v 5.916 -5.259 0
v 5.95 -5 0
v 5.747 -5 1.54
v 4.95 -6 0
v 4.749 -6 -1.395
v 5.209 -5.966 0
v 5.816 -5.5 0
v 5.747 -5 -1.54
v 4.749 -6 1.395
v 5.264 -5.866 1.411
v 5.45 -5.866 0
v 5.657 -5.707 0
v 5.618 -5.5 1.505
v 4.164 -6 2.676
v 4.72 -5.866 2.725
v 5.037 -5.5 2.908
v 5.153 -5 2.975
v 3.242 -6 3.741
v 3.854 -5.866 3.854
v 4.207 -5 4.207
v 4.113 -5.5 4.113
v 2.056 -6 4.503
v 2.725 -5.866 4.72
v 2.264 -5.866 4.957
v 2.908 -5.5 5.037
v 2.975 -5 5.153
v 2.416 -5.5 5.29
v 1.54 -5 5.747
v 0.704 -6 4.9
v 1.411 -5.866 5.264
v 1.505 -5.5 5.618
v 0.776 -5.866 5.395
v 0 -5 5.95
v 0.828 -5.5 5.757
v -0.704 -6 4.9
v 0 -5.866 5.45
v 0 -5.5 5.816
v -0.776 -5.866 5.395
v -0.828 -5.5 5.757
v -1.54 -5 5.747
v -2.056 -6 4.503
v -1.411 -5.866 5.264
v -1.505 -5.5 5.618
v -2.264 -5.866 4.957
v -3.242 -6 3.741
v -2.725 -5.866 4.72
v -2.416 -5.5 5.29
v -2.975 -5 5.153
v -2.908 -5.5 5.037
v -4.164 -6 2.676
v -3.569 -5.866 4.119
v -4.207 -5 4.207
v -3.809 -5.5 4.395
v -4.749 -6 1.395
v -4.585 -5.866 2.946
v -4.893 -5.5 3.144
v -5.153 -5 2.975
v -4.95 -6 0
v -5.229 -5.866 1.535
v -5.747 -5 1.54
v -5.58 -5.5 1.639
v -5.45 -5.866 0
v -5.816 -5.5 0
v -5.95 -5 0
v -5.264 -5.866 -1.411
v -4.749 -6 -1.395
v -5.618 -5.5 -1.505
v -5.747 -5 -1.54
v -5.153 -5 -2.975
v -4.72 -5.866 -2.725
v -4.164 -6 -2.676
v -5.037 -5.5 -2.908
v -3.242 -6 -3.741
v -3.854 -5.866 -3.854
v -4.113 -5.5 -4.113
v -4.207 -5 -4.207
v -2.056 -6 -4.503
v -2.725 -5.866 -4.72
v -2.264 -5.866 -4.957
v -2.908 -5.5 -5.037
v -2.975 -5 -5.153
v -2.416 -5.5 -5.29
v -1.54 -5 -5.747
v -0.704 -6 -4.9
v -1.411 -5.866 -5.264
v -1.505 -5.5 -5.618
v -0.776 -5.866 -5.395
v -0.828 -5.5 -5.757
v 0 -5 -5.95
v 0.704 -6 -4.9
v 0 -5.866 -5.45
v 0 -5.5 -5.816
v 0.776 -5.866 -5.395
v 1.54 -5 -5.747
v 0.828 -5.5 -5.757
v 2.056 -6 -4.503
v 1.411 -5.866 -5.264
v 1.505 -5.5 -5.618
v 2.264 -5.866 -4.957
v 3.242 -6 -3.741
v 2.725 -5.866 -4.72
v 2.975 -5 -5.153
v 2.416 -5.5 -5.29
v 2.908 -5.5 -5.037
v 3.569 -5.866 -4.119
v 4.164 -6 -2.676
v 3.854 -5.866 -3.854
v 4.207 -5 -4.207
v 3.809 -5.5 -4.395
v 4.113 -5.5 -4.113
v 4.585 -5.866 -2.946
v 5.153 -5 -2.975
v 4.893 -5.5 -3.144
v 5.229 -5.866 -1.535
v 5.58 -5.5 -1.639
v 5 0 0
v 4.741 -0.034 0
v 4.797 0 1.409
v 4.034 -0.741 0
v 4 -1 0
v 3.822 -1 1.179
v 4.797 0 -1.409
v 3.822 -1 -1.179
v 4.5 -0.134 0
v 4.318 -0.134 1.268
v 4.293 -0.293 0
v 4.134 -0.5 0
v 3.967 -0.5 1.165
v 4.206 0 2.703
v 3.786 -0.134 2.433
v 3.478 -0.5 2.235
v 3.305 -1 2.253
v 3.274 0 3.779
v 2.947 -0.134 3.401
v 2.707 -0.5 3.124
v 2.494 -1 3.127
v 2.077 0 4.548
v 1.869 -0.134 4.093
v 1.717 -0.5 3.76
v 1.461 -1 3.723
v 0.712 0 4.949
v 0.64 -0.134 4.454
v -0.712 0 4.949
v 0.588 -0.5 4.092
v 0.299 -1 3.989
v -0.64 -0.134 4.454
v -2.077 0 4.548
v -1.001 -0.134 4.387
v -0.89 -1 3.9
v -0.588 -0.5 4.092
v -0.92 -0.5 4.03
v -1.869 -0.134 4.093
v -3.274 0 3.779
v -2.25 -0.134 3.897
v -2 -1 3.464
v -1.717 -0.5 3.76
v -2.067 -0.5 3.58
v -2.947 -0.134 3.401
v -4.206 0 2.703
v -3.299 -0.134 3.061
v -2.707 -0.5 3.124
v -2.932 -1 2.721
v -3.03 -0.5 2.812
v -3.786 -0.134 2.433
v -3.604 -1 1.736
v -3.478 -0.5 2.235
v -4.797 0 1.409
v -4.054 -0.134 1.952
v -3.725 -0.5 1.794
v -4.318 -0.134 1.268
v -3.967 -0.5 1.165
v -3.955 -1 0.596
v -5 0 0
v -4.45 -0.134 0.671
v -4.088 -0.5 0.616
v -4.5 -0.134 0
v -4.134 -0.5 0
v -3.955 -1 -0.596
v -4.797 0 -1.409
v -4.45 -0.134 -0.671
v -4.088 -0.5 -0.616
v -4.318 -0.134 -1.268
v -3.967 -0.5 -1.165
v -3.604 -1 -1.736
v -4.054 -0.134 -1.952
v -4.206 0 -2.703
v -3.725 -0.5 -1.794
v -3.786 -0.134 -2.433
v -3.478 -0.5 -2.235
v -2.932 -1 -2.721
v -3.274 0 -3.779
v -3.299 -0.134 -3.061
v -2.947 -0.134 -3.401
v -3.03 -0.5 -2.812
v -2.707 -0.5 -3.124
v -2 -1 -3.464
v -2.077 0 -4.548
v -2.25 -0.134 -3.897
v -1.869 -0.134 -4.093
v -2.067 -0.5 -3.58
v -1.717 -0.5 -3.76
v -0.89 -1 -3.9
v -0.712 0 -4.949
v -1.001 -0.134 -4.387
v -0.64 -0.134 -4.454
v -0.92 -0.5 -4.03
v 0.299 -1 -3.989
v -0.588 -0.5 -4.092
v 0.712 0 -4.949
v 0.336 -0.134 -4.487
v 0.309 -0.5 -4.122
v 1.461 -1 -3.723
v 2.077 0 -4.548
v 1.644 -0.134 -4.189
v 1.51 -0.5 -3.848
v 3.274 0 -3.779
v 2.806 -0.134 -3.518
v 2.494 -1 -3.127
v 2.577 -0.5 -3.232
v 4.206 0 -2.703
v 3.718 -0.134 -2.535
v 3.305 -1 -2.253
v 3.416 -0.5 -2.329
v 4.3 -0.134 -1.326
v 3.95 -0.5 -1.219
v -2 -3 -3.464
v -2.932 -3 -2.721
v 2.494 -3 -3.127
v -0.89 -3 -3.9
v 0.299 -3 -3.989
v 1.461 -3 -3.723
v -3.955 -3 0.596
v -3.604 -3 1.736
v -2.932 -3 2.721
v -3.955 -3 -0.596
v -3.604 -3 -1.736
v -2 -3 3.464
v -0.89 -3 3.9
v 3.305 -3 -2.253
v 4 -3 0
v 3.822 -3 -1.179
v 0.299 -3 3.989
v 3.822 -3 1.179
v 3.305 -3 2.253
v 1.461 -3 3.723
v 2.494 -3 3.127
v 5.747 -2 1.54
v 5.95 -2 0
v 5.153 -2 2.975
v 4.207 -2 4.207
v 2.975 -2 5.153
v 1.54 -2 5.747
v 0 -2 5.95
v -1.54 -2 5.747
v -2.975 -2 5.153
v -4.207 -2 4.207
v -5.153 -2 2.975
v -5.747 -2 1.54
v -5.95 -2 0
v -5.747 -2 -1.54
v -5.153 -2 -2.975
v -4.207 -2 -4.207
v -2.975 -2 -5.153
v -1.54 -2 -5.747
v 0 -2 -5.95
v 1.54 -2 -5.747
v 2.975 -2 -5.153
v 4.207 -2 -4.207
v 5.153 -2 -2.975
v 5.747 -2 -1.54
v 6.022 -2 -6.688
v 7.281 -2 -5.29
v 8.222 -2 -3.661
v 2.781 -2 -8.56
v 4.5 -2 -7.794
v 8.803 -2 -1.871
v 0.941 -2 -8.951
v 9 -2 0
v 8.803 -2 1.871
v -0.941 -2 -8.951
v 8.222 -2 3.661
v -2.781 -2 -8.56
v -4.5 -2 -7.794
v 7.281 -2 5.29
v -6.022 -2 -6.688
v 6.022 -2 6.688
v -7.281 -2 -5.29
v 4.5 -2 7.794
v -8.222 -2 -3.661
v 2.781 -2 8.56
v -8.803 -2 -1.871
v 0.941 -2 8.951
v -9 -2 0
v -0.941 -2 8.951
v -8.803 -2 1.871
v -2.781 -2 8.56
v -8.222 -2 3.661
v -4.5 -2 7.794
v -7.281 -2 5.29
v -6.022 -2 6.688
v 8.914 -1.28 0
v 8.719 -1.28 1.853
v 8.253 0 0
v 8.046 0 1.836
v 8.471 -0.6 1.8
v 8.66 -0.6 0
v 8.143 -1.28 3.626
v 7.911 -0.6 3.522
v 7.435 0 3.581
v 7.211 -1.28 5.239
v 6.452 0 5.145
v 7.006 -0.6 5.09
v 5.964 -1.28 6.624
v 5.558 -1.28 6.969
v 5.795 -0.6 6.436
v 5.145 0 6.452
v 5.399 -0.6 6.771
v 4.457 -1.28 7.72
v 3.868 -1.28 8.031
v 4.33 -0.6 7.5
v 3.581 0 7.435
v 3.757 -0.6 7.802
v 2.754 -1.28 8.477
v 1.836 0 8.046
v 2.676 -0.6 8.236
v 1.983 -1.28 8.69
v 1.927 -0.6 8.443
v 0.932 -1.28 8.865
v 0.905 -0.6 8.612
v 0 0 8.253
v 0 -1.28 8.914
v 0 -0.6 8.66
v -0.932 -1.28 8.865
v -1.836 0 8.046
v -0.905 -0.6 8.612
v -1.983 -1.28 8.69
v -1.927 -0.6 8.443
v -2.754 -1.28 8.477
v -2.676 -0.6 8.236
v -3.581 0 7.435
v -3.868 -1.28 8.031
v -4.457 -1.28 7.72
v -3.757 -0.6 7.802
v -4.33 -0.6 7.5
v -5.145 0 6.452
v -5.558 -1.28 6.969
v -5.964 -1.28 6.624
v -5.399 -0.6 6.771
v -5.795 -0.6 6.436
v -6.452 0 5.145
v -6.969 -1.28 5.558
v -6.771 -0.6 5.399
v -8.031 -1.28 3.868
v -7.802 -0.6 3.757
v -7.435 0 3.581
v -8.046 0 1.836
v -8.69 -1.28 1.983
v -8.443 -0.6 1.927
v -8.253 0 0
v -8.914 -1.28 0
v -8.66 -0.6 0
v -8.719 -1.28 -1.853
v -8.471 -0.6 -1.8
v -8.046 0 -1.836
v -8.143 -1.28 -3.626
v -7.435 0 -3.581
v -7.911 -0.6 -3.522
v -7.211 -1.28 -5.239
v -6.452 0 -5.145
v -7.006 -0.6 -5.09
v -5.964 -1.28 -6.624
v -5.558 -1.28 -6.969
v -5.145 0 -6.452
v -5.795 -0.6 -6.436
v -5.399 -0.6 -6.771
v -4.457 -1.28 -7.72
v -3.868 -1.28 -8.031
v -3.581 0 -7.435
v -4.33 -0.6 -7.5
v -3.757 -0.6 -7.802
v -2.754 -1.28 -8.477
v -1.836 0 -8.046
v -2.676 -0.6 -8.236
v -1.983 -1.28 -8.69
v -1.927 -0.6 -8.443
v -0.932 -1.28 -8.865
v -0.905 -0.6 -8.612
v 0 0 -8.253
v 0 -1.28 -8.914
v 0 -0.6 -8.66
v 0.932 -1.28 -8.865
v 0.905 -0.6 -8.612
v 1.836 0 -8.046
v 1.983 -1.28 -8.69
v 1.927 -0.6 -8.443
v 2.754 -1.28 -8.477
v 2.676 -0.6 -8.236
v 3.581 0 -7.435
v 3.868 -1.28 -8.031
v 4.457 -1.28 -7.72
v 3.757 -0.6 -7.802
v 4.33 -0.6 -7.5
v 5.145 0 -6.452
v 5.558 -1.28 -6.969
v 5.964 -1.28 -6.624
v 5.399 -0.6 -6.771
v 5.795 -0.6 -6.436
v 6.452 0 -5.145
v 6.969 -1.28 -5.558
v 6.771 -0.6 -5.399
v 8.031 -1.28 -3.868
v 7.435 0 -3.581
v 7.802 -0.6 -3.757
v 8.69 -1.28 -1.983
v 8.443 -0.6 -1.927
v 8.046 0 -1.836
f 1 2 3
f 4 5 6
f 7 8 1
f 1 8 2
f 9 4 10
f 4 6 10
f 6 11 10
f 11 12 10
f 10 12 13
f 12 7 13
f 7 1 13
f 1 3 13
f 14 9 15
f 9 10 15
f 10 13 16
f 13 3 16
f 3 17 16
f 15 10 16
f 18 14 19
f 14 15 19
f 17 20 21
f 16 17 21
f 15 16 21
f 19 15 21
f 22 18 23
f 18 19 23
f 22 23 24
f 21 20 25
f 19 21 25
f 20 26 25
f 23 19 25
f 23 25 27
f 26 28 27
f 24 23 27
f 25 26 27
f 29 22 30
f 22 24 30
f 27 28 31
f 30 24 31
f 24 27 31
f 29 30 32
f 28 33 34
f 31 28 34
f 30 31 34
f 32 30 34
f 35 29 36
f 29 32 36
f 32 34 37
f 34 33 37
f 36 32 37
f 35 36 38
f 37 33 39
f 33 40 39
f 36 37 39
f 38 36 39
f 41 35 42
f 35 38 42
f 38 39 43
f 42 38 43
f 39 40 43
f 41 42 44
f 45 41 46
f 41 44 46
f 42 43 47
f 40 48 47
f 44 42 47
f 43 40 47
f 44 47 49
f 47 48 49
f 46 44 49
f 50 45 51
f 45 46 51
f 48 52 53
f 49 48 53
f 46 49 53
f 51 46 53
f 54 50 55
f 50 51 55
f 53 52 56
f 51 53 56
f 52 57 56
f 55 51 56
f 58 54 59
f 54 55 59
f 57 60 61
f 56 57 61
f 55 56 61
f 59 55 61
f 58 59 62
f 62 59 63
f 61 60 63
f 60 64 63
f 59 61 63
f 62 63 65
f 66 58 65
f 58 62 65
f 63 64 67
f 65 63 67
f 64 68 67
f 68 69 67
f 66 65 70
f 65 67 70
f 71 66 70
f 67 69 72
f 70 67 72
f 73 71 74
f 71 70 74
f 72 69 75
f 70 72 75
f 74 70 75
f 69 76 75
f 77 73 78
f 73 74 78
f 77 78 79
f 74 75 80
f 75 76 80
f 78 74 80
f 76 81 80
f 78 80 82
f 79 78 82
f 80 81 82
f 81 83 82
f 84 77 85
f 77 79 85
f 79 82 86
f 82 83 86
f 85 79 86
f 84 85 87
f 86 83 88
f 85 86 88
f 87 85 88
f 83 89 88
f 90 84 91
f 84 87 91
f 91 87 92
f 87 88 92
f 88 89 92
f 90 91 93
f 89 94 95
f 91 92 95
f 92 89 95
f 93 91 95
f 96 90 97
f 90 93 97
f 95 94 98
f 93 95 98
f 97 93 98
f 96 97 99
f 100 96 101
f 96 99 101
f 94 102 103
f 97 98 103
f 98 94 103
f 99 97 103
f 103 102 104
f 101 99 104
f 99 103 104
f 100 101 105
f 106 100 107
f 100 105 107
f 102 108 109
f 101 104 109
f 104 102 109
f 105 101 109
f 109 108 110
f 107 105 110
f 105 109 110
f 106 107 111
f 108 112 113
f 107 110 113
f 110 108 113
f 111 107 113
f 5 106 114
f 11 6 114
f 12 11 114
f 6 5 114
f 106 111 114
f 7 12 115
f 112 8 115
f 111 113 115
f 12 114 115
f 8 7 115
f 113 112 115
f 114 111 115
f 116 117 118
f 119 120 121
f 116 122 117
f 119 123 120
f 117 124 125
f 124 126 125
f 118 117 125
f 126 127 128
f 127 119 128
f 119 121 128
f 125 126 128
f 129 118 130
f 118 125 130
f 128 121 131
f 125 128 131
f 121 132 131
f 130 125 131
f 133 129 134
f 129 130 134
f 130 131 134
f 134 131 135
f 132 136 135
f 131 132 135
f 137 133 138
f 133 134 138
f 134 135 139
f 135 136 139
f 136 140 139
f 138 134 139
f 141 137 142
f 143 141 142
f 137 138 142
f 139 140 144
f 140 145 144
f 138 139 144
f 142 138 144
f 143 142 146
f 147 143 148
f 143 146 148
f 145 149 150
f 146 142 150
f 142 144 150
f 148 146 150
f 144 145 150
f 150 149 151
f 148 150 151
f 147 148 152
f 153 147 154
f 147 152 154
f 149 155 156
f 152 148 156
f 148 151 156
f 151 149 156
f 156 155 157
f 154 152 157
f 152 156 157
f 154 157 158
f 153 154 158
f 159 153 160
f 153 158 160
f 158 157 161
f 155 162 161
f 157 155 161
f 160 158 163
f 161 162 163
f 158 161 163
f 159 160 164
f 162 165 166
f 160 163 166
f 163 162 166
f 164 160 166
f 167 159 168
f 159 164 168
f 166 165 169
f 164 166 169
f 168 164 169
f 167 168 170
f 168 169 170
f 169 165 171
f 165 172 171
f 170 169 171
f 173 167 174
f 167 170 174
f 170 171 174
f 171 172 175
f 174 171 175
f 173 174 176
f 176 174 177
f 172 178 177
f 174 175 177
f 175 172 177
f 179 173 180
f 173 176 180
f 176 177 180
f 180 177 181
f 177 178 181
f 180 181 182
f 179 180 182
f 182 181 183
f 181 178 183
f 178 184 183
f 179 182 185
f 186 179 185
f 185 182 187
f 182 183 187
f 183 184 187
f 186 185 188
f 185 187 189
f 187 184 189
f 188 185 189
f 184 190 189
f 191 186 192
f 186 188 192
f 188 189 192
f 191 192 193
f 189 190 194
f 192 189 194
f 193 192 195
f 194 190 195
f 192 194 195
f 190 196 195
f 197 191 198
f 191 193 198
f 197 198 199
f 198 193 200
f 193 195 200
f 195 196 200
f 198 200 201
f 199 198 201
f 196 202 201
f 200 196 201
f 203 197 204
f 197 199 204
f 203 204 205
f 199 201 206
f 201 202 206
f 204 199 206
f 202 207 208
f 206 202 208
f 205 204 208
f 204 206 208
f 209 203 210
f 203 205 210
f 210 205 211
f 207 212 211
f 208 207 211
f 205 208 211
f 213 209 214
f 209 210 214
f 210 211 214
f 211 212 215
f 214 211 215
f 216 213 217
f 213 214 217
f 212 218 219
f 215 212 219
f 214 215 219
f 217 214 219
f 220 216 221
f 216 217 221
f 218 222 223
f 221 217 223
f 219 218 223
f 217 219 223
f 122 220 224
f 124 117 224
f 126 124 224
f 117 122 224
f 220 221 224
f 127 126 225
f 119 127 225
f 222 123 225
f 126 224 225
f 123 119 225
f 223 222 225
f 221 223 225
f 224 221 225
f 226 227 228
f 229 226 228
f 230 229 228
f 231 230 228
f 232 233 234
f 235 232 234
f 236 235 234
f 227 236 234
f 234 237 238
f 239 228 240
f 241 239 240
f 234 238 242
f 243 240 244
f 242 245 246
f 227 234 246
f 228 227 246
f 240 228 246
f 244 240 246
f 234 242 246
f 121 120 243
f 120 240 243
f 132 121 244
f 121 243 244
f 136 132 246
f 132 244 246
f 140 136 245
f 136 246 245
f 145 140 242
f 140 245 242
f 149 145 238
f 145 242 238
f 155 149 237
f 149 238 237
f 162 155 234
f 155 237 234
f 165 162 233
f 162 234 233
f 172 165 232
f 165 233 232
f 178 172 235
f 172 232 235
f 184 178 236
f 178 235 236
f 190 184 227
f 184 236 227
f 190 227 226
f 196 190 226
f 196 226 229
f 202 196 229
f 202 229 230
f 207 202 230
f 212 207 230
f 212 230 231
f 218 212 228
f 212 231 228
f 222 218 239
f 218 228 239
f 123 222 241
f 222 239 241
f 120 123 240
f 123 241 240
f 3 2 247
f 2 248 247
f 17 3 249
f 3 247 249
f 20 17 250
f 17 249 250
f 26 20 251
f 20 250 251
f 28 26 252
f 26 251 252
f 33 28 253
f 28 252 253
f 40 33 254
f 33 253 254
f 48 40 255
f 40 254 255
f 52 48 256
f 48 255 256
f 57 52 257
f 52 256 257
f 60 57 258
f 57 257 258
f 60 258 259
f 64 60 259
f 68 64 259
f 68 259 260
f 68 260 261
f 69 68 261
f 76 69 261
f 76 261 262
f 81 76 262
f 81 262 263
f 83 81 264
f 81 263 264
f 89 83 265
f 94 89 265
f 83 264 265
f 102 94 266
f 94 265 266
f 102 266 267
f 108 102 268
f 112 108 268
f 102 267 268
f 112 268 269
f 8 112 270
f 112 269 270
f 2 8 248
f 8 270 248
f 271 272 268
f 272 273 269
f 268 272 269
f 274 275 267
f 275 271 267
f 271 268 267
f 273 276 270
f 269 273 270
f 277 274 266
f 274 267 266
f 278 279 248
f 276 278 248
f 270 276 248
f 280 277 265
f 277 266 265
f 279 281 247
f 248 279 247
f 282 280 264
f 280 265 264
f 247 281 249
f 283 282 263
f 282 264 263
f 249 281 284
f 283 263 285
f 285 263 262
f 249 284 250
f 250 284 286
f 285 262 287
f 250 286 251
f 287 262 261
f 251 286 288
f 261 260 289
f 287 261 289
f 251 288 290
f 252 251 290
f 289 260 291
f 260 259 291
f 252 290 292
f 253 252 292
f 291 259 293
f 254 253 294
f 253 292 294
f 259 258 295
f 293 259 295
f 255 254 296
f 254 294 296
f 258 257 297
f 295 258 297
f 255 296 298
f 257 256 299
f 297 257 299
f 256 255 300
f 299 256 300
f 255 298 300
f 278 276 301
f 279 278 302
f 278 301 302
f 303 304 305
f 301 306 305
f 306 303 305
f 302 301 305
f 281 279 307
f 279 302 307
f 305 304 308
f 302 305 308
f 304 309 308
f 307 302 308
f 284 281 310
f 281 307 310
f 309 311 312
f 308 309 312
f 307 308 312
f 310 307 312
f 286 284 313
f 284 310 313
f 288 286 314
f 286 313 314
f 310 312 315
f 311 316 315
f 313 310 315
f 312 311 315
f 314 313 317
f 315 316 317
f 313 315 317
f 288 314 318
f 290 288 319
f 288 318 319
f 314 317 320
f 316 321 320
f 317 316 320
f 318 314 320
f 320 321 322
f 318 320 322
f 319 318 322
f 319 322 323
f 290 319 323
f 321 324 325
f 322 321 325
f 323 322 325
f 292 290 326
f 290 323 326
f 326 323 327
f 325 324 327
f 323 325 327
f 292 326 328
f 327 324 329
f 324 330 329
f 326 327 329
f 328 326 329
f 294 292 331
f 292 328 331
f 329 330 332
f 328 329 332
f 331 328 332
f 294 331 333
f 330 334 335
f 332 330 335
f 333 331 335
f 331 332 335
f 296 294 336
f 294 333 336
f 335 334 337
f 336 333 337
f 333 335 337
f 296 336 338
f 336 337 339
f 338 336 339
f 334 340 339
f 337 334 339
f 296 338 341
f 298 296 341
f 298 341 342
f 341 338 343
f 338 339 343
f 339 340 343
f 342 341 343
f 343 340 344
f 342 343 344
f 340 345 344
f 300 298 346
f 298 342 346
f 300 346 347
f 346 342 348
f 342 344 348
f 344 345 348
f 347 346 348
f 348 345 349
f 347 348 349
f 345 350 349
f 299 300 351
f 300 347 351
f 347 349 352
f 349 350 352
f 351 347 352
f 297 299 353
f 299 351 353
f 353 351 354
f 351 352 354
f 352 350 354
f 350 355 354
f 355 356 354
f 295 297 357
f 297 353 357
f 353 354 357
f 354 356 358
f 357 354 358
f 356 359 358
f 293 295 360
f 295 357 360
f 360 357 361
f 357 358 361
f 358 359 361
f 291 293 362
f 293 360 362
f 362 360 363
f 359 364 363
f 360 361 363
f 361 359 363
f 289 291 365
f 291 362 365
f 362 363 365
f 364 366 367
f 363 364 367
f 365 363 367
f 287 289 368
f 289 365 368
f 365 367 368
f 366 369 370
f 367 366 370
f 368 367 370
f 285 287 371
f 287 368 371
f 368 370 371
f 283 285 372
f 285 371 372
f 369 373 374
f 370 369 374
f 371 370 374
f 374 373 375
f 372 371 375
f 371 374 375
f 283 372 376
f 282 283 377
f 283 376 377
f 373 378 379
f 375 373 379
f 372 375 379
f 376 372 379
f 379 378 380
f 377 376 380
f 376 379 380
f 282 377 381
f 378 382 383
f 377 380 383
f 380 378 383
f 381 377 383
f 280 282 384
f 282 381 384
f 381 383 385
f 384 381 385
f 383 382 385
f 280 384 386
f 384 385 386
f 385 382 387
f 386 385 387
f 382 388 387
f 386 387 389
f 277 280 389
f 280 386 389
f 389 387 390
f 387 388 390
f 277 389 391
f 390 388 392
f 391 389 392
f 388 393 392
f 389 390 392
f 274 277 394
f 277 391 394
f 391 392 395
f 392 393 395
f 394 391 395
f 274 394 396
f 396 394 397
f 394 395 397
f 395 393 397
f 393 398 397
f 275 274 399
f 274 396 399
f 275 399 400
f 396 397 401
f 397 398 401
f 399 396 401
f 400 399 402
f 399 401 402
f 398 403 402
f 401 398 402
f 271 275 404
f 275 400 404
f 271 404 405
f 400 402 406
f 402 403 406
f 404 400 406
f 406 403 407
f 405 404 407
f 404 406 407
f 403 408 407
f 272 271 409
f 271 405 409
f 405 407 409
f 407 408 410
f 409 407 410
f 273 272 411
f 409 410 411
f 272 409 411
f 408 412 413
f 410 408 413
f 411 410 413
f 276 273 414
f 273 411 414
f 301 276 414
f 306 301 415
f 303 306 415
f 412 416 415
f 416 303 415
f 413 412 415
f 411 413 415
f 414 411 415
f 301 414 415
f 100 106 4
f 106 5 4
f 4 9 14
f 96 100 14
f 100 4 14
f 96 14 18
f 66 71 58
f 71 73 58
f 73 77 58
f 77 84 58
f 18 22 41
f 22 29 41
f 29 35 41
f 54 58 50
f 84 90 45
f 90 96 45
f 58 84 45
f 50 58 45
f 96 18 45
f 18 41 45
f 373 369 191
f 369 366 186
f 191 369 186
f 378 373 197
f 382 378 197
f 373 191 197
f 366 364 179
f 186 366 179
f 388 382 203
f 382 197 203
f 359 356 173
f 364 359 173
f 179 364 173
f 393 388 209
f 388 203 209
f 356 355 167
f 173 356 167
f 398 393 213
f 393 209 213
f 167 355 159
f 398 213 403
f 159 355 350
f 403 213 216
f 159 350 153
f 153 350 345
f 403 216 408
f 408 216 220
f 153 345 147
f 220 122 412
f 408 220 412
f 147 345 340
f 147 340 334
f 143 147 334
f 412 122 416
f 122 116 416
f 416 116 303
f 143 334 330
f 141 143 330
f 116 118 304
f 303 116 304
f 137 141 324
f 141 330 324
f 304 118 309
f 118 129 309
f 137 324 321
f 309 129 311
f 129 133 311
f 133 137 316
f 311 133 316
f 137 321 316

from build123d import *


with BuildPart() as part:
    # Sketch1 → Revolve1 (revolve)
    with BuildSketch(Plane.XY):
        with BuildLine():
            Line((0, -6), (4.95, -6))
            ThreePointArc((4.95, -6), (5.657106781, -5.707106781), (5.95, -5))
            Line((5.95, -5), (5.95, -2))
            Line((5.95, -2), (9, -2))
            ThreePointArc((9, -2), (8.807077454, -0.932475563), (8.252715788, 0))
            Line((8.252715788, 0), (5, 0))
            ThreePointArc((5, 0), (4.292893219, -0.292893219), (4, -1))
            Line((4, -1), (4, -3))
            Line((4, -3), (0, -3))
            Line((0, -3), (0, -6))
        make_face()
    revolve(axis=Axis((0, 0, 0), (0, -1, 0)))


solid = part.part
